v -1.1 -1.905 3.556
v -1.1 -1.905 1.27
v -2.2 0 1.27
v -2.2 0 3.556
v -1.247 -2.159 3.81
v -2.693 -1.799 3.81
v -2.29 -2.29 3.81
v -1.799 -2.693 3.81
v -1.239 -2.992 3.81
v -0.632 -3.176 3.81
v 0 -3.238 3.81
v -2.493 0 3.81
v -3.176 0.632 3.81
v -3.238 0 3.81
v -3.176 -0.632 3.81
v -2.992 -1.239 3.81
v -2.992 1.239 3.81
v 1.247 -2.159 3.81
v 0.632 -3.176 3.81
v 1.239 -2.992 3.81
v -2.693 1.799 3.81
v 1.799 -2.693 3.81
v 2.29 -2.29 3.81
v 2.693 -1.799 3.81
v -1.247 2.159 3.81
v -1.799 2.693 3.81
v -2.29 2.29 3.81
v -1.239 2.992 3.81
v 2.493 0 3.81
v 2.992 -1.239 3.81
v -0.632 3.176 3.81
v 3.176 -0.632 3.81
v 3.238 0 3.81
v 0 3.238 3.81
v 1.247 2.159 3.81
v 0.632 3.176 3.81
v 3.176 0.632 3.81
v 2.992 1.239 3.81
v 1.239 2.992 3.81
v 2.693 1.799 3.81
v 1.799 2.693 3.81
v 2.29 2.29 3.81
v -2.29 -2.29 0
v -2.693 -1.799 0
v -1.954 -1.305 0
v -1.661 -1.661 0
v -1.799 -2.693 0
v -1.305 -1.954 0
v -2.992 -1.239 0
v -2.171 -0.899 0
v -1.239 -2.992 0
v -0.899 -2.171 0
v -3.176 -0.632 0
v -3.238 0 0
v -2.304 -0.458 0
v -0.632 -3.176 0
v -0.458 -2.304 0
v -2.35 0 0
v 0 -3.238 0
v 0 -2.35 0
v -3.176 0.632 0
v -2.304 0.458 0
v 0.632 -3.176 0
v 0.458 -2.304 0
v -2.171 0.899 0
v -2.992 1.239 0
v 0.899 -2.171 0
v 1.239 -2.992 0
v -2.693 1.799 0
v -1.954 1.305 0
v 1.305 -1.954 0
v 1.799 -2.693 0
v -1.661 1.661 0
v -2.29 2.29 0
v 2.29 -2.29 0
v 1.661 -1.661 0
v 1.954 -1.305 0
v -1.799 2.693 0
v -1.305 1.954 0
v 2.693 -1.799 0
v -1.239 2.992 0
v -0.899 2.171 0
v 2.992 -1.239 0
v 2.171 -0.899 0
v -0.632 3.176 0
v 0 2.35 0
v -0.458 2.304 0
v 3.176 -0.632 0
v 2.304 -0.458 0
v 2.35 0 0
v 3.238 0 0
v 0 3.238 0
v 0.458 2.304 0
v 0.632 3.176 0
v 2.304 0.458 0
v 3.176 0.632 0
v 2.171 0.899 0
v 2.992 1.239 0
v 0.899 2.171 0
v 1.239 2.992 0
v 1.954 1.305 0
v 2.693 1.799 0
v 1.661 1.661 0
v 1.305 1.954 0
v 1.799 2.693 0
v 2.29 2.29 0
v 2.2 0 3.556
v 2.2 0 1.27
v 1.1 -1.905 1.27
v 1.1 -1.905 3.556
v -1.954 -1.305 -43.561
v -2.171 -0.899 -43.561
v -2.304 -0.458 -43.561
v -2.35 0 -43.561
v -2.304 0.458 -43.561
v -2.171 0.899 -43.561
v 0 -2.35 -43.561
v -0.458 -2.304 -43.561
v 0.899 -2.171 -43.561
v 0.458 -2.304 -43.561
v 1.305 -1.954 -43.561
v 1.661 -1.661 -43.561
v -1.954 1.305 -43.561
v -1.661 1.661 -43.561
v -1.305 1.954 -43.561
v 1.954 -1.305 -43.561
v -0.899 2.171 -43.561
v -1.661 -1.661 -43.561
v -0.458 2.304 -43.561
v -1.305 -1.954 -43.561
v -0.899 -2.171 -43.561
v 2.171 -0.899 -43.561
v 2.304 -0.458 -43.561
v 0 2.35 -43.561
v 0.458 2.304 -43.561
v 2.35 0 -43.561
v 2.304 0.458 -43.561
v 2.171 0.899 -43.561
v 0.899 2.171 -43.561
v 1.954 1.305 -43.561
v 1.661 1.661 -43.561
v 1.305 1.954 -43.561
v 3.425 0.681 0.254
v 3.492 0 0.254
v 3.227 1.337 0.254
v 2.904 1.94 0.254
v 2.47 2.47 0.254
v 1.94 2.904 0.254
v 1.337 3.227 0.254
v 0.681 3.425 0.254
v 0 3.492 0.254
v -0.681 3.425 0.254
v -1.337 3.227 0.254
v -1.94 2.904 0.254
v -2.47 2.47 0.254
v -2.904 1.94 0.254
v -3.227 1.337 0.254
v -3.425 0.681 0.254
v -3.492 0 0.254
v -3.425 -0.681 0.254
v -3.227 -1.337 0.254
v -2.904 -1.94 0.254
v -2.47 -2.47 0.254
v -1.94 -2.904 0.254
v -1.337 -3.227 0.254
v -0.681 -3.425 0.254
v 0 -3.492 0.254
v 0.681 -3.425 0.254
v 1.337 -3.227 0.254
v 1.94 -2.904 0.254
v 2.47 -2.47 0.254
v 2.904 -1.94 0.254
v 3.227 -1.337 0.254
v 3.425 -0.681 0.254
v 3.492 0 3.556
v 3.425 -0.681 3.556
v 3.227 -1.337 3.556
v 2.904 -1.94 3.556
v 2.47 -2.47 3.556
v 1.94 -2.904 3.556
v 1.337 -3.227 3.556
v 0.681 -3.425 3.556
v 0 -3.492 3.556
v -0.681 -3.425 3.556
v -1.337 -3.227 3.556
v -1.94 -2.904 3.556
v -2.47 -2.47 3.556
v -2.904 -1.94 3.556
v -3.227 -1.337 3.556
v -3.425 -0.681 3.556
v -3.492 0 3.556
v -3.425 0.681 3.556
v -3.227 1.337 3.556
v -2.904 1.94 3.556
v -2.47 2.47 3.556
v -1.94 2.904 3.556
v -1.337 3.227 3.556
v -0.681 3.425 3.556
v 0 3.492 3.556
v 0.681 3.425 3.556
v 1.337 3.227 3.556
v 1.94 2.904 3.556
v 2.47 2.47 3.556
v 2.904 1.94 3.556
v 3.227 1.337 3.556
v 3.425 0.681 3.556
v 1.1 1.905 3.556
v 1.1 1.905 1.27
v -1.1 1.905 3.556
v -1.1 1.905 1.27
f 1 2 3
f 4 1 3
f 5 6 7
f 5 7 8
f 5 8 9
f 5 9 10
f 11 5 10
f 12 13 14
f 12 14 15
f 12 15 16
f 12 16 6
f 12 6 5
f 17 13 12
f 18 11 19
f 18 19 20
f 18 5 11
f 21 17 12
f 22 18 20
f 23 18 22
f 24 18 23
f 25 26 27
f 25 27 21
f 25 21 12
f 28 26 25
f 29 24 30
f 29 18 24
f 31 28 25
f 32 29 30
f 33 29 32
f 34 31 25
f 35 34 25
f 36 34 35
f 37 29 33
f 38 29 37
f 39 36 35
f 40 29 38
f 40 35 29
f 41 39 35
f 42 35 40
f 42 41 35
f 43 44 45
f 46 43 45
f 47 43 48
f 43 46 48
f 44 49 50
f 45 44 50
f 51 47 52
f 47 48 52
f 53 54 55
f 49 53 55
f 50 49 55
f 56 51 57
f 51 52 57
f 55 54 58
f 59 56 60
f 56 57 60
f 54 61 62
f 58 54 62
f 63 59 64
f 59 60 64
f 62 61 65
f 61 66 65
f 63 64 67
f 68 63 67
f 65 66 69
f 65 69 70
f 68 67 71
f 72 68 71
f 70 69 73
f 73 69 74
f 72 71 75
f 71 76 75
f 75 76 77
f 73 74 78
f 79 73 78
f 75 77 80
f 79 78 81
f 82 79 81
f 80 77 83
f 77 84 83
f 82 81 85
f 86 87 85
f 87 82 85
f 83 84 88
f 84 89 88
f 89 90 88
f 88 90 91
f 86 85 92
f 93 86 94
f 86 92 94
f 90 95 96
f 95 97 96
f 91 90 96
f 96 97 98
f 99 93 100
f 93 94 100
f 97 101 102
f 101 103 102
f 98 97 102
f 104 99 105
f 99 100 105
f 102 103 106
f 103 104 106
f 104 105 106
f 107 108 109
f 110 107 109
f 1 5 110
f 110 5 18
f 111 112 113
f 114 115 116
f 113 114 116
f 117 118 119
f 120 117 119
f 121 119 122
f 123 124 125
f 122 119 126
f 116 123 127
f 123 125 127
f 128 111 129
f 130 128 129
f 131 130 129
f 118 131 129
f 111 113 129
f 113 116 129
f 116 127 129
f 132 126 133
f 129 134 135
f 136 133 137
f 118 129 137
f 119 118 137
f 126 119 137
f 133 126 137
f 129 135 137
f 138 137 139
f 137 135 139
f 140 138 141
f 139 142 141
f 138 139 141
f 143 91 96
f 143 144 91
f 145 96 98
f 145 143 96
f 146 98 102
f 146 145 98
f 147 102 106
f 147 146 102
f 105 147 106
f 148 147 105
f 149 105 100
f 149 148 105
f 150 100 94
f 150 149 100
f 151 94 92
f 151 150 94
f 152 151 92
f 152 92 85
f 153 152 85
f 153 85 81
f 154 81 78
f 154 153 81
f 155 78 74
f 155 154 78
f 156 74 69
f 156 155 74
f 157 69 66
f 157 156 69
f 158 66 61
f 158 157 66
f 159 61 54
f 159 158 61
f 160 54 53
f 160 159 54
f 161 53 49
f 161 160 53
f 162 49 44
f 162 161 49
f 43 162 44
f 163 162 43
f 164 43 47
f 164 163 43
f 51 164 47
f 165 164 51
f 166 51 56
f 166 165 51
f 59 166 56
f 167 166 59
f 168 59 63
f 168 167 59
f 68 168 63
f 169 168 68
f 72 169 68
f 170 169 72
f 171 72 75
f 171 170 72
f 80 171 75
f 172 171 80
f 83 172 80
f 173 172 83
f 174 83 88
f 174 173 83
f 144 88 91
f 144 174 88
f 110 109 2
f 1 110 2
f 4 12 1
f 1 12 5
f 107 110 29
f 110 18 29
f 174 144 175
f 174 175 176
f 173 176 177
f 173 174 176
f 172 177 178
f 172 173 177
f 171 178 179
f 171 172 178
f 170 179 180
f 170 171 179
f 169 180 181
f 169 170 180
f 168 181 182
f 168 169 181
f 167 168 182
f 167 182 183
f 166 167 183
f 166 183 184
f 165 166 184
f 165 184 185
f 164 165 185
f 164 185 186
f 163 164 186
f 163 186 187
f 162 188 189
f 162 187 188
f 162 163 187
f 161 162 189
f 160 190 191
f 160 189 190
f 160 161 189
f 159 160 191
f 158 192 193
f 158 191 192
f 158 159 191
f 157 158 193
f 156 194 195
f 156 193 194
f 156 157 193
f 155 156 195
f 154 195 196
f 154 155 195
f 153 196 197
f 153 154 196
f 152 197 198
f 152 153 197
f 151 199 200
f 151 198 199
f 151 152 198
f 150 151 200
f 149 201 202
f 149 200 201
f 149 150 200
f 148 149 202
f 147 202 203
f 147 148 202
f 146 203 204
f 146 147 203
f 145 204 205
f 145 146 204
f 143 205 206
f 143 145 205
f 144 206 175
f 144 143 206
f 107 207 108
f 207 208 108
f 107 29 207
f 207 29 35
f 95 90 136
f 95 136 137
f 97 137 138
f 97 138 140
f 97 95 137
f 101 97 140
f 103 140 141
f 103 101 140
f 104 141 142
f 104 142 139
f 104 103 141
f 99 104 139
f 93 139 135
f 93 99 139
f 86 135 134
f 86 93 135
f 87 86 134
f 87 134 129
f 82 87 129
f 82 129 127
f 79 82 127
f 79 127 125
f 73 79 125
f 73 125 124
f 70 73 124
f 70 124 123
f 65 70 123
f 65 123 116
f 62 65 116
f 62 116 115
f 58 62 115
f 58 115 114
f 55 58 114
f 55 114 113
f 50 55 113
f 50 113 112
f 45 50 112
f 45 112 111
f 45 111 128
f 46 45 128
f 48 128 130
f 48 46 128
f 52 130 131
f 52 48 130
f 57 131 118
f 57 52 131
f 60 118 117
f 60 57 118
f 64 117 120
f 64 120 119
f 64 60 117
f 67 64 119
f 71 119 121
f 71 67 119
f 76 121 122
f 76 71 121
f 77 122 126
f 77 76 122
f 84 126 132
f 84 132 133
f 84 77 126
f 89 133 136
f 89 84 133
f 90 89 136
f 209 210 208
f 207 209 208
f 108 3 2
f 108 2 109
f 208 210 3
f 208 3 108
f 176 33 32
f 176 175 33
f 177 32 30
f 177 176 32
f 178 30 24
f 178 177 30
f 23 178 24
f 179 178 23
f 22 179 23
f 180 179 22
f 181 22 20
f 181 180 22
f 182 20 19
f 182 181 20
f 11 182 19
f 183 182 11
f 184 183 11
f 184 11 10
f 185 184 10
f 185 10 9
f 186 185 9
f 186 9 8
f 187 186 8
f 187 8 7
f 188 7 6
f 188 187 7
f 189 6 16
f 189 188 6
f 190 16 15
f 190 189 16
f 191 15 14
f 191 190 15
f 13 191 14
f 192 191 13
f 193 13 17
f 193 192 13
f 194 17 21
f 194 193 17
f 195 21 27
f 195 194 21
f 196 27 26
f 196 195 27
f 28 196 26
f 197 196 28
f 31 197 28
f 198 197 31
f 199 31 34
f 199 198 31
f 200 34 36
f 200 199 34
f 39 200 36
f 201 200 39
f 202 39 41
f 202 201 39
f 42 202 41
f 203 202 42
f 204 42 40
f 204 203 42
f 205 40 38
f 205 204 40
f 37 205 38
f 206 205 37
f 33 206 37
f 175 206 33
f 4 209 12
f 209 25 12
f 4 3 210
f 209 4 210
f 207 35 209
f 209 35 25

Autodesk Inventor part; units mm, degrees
ref_plane "YZ Plane" through (0, 0, 0) normal (1, 0, 0) x (0, 1, 0)
ref_plane "XZ Plane" through (0, 0, 0) normal (0, 1, 0) x (-1, 0, 0)
ref_plane "XY Plane" through (0, 0, 0) normal (0, 0, 1) x (1, 0, 0)
sketch "Sketch1" plane through (0, 0, 0) normal (0, 0, 1) x (1, 0, 0)
  circle A0 centre (0, 0) radius 3.4925
  circle A1 centre (0, 0) radius 2.3495
  line L0 (2.1997, 0) -> (1.0999, -1.905)
  line L1 (1.0999, -1.905) -> (-1.0999, -1.905)
  line L2 (-1.0999, -1.905) -> (-2.1997, 0)
  line L3 (-2.1997, 0) -> (-1.0999, 1.905)
  line L4 (-1.0999, 1.905) -> (1.0999, 1.905)
  line L5 (1.0999, 1.905) -> (2.1997, 0)
  dimension "d0" = 6.985
  dimension "d1" = 4.699
  dimension "d2" = 3.81
extrude "Extrusion1" add sketch "Sketch1" along normal blind 3.81 contours A0 | A1
extrude "Extrusion2" add sketch "Sketch1" against normal blind 43.561 contours A1 | L0 L1 L2 L3 L4 L5
extrude "Extrusion3" add sketch "Sketch1" along normal blind 1.27 contours L0 L1 L2 L3 L4 L5
thread "Thread1" size "10-32 UNF" class "2A" standard "ANSI Unified Screw Threads" full length
chamfer "Chamfer1" distance 0.254 angle 45 8 edges at (-3.4925, 0, 3.81) (-3.4925, 0, 0) (-1.6498, 0.9525, 3.81) (-1.6498, -0.9525, 3.81) (0, -1.905, 3.81) (1.6498, -0.9525, 3.81) (1.6498, 0.9525, 3.81) (0, 1.905, 3.81)
properties part number "Gearbox Hex Machine Screw" material "Steel"
